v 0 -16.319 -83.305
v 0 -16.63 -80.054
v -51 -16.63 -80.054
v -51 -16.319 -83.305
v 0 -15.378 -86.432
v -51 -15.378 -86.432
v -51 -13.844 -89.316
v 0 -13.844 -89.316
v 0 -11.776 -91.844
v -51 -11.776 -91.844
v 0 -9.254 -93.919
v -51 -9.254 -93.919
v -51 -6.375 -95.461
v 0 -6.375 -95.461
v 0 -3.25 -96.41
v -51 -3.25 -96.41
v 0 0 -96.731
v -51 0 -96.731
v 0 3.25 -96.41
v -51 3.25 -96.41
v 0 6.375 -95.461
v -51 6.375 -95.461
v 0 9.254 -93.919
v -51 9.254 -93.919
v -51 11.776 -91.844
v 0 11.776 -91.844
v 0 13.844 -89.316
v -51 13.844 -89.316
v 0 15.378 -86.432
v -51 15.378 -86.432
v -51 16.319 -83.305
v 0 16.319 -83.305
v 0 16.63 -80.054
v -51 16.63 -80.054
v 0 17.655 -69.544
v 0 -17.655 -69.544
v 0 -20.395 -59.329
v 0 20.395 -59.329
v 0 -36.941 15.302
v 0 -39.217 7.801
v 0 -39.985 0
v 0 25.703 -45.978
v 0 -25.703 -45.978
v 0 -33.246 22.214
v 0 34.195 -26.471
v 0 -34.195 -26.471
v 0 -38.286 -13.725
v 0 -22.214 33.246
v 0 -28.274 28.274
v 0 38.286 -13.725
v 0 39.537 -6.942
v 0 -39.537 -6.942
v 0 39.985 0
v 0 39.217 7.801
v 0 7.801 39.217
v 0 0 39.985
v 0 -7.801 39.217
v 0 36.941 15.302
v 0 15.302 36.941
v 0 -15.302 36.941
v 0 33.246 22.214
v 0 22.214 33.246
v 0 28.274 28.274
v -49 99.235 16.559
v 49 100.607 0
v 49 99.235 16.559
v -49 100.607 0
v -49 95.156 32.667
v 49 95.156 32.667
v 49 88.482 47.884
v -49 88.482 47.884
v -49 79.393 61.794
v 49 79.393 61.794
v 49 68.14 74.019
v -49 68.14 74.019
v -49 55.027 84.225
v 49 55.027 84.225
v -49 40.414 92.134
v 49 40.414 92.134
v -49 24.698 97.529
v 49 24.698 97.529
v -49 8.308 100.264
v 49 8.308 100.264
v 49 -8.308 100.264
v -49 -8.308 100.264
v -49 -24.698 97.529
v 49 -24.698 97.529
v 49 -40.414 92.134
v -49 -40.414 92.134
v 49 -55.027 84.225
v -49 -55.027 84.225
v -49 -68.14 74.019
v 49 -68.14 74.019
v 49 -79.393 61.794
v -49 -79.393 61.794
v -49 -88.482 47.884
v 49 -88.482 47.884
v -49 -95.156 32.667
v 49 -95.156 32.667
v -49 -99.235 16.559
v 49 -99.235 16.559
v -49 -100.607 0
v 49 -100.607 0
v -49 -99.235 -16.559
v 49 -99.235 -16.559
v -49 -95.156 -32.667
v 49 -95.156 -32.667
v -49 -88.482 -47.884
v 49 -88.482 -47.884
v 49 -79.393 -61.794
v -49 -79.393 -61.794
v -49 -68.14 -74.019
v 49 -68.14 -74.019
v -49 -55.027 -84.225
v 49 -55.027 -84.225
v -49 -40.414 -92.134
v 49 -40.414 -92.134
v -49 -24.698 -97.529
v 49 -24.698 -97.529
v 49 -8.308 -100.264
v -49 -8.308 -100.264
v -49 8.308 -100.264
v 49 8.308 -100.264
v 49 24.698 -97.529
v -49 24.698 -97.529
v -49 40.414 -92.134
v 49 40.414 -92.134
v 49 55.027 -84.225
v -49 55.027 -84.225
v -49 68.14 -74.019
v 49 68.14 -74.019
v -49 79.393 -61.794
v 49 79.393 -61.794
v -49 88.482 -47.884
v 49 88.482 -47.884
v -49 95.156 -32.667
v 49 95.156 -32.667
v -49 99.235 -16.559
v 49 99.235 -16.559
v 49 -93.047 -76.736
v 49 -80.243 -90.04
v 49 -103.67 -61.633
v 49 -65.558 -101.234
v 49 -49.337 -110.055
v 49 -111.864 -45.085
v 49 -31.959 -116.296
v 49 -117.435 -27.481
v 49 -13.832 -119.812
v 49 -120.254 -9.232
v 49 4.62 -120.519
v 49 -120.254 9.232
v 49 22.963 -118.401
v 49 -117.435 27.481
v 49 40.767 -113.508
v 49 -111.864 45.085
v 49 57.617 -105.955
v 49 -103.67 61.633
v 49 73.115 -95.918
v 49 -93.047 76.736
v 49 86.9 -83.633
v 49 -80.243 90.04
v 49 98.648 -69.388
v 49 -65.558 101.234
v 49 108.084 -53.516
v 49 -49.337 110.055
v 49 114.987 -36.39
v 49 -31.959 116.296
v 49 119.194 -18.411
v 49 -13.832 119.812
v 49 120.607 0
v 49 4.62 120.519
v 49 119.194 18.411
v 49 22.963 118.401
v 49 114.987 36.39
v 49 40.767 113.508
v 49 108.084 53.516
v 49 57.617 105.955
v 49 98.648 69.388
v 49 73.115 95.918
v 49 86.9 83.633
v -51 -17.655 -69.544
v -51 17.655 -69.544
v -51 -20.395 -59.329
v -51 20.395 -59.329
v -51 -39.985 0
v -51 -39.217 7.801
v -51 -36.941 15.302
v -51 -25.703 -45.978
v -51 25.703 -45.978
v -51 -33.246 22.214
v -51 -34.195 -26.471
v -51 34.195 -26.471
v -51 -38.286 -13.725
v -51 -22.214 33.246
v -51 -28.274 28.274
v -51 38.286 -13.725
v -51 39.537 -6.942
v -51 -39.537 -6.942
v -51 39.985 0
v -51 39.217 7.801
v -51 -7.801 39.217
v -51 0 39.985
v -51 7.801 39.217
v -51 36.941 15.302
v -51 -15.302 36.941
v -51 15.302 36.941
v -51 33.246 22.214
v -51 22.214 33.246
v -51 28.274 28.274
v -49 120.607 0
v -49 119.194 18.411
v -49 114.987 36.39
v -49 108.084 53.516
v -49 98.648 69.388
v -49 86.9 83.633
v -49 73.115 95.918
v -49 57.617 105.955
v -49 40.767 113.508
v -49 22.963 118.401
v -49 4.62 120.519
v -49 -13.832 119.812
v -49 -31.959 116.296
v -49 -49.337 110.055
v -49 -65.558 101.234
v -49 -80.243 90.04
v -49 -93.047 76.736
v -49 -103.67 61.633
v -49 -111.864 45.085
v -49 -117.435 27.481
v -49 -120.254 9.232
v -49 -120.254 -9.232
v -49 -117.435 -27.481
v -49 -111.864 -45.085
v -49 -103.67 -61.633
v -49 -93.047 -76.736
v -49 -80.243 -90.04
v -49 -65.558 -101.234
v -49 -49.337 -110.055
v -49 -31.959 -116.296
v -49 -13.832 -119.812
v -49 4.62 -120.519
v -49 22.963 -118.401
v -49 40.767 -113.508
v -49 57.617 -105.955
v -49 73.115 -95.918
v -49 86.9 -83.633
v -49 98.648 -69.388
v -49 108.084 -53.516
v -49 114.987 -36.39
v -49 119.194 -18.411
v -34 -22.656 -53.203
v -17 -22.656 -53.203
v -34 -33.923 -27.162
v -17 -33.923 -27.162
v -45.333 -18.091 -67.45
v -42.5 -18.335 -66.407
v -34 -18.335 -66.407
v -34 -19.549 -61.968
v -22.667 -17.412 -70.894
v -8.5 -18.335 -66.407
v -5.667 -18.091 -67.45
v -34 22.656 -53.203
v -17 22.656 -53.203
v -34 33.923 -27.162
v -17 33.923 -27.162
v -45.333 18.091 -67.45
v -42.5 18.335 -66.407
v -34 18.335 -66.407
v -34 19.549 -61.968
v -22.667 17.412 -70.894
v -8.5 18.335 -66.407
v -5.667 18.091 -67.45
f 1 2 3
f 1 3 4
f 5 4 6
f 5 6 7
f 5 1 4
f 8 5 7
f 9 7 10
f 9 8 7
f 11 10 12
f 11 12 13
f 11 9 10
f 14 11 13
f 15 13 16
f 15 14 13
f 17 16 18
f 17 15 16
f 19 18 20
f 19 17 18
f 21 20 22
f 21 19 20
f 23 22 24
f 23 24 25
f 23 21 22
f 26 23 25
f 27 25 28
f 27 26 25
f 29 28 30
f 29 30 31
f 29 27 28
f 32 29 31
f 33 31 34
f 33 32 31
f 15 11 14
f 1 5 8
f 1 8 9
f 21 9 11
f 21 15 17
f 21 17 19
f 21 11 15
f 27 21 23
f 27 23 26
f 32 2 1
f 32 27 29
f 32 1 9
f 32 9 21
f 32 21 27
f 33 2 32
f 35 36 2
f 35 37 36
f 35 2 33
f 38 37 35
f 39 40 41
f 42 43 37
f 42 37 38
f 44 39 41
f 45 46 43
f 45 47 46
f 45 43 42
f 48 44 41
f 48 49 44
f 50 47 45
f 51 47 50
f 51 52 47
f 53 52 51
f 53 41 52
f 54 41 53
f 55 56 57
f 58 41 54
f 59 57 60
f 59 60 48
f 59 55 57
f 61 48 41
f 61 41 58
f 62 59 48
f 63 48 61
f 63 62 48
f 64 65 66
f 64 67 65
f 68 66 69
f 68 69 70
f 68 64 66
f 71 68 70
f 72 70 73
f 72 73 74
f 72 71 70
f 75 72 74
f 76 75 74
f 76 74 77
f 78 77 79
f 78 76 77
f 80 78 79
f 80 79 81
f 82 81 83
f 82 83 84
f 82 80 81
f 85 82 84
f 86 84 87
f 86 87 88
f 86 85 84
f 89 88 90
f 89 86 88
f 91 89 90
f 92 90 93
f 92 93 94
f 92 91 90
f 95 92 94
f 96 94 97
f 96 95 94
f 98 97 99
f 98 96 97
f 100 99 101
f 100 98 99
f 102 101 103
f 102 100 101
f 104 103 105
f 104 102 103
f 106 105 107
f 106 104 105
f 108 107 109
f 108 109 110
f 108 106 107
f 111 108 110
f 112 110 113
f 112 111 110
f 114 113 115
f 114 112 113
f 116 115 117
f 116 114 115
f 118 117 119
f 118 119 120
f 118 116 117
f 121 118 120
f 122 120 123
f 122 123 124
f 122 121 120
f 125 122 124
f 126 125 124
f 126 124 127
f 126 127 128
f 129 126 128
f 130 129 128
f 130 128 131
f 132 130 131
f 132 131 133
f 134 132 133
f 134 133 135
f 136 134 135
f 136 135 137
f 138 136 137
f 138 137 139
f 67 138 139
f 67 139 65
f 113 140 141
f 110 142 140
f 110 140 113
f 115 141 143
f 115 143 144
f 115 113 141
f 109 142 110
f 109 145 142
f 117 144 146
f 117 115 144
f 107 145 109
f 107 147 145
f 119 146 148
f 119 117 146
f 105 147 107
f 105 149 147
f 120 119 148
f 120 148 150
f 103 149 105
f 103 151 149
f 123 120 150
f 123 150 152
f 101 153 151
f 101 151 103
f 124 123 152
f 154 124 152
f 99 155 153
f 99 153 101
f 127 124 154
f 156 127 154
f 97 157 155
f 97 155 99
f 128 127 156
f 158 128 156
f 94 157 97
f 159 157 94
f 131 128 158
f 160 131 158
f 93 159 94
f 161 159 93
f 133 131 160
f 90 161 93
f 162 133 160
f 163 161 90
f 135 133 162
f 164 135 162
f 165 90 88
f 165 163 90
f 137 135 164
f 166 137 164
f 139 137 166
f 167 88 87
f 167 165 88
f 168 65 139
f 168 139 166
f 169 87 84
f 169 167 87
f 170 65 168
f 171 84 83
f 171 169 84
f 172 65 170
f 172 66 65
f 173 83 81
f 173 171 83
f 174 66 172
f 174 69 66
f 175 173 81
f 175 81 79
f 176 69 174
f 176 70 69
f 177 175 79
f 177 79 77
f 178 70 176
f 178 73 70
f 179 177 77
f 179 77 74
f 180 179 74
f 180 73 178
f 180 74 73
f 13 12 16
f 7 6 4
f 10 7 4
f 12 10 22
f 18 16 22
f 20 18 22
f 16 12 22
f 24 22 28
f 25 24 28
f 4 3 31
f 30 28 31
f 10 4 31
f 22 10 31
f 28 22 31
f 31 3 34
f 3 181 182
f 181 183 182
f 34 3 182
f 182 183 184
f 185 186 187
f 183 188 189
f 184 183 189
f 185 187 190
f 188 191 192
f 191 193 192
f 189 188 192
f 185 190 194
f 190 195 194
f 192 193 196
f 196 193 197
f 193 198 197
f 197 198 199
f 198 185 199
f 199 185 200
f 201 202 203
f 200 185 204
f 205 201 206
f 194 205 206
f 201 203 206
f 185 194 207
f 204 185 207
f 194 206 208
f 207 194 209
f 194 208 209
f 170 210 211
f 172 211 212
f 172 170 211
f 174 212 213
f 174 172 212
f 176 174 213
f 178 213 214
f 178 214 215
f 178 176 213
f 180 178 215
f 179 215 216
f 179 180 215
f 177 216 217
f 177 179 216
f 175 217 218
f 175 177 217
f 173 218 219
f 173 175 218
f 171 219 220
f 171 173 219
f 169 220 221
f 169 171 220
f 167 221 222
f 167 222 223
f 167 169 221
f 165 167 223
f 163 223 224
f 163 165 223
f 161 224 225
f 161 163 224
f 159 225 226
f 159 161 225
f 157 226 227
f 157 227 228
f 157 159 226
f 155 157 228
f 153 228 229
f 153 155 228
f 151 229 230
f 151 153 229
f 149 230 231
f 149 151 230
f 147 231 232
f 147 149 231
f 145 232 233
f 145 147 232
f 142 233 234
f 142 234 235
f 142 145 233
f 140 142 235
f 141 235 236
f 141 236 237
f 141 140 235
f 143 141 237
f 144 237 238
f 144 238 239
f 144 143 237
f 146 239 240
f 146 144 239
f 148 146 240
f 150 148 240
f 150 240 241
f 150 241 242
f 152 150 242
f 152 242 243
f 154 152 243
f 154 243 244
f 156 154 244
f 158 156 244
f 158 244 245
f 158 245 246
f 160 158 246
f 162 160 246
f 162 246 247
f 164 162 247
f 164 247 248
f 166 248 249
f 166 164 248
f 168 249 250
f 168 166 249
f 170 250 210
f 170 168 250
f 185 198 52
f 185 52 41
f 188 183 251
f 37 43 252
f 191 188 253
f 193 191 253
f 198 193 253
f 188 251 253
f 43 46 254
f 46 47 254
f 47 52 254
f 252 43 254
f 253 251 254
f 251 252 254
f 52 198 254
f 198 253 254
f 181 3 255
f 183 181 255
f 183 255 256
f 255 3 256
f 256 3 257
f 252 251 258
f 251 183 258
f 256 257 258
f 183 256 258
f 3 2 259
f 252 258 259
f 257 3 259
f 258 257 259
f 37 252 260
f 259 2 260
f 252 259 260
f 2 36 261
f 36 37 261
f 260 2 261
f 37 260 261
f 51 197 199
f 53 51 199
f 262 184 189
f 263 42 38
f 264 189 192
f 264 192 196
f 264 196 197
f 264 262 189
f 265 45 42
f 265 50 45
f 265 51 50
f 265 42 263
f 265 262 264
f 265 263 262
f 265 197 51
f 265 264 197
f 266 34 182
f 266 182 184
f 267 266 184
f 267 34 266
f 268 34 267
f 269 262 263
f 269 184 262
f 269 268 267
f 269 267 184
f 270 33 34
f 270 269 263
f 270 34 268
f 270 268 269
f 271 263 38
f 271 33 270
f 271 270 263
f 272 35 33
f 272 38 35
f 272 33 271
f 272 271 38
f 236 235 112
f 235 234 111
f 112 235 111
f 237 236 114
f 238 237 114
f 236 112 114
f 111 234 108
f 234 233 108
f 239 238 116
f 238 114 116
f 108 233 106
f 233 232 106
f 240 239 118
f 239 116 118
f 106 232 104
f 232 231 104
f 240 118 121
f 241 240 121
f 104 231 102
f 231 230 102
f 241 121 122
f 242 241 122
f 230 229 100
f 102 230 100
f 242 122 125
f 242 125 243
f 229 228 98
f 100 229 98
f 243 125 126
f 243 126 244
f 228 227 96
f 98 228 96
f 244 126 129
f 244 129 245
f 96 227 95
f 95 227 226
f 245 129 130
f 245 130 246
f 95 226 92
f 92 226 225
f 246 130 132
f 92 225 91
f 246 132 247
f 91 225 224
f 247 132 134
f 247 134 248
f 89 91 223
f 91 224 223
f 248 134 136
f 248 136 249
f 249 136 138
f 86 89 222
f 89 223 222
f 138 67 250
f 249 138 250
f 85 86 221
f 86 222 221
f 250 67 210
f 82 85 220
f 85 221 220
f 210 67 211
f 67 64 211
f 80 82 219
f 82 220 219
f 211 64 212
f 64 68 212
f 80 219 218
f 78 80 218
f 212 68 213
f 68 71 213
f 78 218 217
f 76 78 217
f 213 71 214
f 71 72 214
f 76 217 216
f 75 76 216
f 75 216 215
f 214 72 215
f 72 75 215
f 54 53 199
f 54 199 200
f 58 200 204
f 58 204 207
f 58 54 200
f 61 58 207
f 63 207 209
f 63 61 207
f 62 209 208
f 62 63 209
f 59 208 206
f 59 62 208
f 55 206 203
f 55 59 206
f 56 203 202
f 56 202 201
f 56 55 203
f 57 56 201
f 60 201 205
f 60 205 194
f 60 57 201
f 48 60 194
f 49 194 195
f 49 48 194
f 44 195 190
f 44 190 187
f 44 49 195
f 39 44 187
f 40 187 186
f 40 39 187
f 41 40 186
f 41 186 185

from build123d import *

# Parameters (mm, degrees)
F0_R     = 22.8209931427
F1_DEPTH = 34.544
F3_DEPTH = 51
F4_R     = 120.6073984504
F4_R_2   = 100.607397247
F5_DEPTH = 49


with BuildPart() as f1:
    # F0 (on Right) → F1 (new body)
    with BuildSketch(Plane.YZ):
        Circle(F0_R)
    extrude(amount=-F1_DEPTH)

    # F2 (on face) → F3 (join)
    with BuildSketch(Plane.YZ):
        with BuildLine():
            add(Edge.make_bspline(
                [(16.6304931045, -80.0537467003), (16.5519428961, -52.1548158816), (40.0091622509, -28.3662351914), (39.9848685014, 0)],
                knots=[0, 0, 0, 0, 83.3908221025, 83.3908221025, 83.3908221025, 83.3908221025], degree=3))
            ThreePointArc((39.9848685014, 0), (0, 39.9848685014), (-39.9848685014, 0))
            add(Edge.make_bspline(
                [(-16.6304931045, -80.0537467003), (-16.5519428961, -52.1548158816), (-40.0091622509, -28.3662351914), (-39.9848685014, 0)],
                knots=[0, 0, 0, 0, 83.3908221025, 83.3908221025, 83.3908221025, 83.3908221025], degree=3))
            ThreePointArc((-16.6304931045, -80.0537467003), (0, -96.7311293327), (16.6304931045, -80.0537467003))
        make_face()
    extrude(amount=-F3_DEPTH)


with BuildPart() as f5:
    # F4 (on face) → F5 (new body, symmetric)
    with BuildSketch(Plane.YZ):
        Circle(F4_R)
        Circle(F4_R_2, mode=Mode.SUBTRACT)
    extrude(amount=F5_DEPTH, both=True)


solid = Compound([f1.part, f5.part])
